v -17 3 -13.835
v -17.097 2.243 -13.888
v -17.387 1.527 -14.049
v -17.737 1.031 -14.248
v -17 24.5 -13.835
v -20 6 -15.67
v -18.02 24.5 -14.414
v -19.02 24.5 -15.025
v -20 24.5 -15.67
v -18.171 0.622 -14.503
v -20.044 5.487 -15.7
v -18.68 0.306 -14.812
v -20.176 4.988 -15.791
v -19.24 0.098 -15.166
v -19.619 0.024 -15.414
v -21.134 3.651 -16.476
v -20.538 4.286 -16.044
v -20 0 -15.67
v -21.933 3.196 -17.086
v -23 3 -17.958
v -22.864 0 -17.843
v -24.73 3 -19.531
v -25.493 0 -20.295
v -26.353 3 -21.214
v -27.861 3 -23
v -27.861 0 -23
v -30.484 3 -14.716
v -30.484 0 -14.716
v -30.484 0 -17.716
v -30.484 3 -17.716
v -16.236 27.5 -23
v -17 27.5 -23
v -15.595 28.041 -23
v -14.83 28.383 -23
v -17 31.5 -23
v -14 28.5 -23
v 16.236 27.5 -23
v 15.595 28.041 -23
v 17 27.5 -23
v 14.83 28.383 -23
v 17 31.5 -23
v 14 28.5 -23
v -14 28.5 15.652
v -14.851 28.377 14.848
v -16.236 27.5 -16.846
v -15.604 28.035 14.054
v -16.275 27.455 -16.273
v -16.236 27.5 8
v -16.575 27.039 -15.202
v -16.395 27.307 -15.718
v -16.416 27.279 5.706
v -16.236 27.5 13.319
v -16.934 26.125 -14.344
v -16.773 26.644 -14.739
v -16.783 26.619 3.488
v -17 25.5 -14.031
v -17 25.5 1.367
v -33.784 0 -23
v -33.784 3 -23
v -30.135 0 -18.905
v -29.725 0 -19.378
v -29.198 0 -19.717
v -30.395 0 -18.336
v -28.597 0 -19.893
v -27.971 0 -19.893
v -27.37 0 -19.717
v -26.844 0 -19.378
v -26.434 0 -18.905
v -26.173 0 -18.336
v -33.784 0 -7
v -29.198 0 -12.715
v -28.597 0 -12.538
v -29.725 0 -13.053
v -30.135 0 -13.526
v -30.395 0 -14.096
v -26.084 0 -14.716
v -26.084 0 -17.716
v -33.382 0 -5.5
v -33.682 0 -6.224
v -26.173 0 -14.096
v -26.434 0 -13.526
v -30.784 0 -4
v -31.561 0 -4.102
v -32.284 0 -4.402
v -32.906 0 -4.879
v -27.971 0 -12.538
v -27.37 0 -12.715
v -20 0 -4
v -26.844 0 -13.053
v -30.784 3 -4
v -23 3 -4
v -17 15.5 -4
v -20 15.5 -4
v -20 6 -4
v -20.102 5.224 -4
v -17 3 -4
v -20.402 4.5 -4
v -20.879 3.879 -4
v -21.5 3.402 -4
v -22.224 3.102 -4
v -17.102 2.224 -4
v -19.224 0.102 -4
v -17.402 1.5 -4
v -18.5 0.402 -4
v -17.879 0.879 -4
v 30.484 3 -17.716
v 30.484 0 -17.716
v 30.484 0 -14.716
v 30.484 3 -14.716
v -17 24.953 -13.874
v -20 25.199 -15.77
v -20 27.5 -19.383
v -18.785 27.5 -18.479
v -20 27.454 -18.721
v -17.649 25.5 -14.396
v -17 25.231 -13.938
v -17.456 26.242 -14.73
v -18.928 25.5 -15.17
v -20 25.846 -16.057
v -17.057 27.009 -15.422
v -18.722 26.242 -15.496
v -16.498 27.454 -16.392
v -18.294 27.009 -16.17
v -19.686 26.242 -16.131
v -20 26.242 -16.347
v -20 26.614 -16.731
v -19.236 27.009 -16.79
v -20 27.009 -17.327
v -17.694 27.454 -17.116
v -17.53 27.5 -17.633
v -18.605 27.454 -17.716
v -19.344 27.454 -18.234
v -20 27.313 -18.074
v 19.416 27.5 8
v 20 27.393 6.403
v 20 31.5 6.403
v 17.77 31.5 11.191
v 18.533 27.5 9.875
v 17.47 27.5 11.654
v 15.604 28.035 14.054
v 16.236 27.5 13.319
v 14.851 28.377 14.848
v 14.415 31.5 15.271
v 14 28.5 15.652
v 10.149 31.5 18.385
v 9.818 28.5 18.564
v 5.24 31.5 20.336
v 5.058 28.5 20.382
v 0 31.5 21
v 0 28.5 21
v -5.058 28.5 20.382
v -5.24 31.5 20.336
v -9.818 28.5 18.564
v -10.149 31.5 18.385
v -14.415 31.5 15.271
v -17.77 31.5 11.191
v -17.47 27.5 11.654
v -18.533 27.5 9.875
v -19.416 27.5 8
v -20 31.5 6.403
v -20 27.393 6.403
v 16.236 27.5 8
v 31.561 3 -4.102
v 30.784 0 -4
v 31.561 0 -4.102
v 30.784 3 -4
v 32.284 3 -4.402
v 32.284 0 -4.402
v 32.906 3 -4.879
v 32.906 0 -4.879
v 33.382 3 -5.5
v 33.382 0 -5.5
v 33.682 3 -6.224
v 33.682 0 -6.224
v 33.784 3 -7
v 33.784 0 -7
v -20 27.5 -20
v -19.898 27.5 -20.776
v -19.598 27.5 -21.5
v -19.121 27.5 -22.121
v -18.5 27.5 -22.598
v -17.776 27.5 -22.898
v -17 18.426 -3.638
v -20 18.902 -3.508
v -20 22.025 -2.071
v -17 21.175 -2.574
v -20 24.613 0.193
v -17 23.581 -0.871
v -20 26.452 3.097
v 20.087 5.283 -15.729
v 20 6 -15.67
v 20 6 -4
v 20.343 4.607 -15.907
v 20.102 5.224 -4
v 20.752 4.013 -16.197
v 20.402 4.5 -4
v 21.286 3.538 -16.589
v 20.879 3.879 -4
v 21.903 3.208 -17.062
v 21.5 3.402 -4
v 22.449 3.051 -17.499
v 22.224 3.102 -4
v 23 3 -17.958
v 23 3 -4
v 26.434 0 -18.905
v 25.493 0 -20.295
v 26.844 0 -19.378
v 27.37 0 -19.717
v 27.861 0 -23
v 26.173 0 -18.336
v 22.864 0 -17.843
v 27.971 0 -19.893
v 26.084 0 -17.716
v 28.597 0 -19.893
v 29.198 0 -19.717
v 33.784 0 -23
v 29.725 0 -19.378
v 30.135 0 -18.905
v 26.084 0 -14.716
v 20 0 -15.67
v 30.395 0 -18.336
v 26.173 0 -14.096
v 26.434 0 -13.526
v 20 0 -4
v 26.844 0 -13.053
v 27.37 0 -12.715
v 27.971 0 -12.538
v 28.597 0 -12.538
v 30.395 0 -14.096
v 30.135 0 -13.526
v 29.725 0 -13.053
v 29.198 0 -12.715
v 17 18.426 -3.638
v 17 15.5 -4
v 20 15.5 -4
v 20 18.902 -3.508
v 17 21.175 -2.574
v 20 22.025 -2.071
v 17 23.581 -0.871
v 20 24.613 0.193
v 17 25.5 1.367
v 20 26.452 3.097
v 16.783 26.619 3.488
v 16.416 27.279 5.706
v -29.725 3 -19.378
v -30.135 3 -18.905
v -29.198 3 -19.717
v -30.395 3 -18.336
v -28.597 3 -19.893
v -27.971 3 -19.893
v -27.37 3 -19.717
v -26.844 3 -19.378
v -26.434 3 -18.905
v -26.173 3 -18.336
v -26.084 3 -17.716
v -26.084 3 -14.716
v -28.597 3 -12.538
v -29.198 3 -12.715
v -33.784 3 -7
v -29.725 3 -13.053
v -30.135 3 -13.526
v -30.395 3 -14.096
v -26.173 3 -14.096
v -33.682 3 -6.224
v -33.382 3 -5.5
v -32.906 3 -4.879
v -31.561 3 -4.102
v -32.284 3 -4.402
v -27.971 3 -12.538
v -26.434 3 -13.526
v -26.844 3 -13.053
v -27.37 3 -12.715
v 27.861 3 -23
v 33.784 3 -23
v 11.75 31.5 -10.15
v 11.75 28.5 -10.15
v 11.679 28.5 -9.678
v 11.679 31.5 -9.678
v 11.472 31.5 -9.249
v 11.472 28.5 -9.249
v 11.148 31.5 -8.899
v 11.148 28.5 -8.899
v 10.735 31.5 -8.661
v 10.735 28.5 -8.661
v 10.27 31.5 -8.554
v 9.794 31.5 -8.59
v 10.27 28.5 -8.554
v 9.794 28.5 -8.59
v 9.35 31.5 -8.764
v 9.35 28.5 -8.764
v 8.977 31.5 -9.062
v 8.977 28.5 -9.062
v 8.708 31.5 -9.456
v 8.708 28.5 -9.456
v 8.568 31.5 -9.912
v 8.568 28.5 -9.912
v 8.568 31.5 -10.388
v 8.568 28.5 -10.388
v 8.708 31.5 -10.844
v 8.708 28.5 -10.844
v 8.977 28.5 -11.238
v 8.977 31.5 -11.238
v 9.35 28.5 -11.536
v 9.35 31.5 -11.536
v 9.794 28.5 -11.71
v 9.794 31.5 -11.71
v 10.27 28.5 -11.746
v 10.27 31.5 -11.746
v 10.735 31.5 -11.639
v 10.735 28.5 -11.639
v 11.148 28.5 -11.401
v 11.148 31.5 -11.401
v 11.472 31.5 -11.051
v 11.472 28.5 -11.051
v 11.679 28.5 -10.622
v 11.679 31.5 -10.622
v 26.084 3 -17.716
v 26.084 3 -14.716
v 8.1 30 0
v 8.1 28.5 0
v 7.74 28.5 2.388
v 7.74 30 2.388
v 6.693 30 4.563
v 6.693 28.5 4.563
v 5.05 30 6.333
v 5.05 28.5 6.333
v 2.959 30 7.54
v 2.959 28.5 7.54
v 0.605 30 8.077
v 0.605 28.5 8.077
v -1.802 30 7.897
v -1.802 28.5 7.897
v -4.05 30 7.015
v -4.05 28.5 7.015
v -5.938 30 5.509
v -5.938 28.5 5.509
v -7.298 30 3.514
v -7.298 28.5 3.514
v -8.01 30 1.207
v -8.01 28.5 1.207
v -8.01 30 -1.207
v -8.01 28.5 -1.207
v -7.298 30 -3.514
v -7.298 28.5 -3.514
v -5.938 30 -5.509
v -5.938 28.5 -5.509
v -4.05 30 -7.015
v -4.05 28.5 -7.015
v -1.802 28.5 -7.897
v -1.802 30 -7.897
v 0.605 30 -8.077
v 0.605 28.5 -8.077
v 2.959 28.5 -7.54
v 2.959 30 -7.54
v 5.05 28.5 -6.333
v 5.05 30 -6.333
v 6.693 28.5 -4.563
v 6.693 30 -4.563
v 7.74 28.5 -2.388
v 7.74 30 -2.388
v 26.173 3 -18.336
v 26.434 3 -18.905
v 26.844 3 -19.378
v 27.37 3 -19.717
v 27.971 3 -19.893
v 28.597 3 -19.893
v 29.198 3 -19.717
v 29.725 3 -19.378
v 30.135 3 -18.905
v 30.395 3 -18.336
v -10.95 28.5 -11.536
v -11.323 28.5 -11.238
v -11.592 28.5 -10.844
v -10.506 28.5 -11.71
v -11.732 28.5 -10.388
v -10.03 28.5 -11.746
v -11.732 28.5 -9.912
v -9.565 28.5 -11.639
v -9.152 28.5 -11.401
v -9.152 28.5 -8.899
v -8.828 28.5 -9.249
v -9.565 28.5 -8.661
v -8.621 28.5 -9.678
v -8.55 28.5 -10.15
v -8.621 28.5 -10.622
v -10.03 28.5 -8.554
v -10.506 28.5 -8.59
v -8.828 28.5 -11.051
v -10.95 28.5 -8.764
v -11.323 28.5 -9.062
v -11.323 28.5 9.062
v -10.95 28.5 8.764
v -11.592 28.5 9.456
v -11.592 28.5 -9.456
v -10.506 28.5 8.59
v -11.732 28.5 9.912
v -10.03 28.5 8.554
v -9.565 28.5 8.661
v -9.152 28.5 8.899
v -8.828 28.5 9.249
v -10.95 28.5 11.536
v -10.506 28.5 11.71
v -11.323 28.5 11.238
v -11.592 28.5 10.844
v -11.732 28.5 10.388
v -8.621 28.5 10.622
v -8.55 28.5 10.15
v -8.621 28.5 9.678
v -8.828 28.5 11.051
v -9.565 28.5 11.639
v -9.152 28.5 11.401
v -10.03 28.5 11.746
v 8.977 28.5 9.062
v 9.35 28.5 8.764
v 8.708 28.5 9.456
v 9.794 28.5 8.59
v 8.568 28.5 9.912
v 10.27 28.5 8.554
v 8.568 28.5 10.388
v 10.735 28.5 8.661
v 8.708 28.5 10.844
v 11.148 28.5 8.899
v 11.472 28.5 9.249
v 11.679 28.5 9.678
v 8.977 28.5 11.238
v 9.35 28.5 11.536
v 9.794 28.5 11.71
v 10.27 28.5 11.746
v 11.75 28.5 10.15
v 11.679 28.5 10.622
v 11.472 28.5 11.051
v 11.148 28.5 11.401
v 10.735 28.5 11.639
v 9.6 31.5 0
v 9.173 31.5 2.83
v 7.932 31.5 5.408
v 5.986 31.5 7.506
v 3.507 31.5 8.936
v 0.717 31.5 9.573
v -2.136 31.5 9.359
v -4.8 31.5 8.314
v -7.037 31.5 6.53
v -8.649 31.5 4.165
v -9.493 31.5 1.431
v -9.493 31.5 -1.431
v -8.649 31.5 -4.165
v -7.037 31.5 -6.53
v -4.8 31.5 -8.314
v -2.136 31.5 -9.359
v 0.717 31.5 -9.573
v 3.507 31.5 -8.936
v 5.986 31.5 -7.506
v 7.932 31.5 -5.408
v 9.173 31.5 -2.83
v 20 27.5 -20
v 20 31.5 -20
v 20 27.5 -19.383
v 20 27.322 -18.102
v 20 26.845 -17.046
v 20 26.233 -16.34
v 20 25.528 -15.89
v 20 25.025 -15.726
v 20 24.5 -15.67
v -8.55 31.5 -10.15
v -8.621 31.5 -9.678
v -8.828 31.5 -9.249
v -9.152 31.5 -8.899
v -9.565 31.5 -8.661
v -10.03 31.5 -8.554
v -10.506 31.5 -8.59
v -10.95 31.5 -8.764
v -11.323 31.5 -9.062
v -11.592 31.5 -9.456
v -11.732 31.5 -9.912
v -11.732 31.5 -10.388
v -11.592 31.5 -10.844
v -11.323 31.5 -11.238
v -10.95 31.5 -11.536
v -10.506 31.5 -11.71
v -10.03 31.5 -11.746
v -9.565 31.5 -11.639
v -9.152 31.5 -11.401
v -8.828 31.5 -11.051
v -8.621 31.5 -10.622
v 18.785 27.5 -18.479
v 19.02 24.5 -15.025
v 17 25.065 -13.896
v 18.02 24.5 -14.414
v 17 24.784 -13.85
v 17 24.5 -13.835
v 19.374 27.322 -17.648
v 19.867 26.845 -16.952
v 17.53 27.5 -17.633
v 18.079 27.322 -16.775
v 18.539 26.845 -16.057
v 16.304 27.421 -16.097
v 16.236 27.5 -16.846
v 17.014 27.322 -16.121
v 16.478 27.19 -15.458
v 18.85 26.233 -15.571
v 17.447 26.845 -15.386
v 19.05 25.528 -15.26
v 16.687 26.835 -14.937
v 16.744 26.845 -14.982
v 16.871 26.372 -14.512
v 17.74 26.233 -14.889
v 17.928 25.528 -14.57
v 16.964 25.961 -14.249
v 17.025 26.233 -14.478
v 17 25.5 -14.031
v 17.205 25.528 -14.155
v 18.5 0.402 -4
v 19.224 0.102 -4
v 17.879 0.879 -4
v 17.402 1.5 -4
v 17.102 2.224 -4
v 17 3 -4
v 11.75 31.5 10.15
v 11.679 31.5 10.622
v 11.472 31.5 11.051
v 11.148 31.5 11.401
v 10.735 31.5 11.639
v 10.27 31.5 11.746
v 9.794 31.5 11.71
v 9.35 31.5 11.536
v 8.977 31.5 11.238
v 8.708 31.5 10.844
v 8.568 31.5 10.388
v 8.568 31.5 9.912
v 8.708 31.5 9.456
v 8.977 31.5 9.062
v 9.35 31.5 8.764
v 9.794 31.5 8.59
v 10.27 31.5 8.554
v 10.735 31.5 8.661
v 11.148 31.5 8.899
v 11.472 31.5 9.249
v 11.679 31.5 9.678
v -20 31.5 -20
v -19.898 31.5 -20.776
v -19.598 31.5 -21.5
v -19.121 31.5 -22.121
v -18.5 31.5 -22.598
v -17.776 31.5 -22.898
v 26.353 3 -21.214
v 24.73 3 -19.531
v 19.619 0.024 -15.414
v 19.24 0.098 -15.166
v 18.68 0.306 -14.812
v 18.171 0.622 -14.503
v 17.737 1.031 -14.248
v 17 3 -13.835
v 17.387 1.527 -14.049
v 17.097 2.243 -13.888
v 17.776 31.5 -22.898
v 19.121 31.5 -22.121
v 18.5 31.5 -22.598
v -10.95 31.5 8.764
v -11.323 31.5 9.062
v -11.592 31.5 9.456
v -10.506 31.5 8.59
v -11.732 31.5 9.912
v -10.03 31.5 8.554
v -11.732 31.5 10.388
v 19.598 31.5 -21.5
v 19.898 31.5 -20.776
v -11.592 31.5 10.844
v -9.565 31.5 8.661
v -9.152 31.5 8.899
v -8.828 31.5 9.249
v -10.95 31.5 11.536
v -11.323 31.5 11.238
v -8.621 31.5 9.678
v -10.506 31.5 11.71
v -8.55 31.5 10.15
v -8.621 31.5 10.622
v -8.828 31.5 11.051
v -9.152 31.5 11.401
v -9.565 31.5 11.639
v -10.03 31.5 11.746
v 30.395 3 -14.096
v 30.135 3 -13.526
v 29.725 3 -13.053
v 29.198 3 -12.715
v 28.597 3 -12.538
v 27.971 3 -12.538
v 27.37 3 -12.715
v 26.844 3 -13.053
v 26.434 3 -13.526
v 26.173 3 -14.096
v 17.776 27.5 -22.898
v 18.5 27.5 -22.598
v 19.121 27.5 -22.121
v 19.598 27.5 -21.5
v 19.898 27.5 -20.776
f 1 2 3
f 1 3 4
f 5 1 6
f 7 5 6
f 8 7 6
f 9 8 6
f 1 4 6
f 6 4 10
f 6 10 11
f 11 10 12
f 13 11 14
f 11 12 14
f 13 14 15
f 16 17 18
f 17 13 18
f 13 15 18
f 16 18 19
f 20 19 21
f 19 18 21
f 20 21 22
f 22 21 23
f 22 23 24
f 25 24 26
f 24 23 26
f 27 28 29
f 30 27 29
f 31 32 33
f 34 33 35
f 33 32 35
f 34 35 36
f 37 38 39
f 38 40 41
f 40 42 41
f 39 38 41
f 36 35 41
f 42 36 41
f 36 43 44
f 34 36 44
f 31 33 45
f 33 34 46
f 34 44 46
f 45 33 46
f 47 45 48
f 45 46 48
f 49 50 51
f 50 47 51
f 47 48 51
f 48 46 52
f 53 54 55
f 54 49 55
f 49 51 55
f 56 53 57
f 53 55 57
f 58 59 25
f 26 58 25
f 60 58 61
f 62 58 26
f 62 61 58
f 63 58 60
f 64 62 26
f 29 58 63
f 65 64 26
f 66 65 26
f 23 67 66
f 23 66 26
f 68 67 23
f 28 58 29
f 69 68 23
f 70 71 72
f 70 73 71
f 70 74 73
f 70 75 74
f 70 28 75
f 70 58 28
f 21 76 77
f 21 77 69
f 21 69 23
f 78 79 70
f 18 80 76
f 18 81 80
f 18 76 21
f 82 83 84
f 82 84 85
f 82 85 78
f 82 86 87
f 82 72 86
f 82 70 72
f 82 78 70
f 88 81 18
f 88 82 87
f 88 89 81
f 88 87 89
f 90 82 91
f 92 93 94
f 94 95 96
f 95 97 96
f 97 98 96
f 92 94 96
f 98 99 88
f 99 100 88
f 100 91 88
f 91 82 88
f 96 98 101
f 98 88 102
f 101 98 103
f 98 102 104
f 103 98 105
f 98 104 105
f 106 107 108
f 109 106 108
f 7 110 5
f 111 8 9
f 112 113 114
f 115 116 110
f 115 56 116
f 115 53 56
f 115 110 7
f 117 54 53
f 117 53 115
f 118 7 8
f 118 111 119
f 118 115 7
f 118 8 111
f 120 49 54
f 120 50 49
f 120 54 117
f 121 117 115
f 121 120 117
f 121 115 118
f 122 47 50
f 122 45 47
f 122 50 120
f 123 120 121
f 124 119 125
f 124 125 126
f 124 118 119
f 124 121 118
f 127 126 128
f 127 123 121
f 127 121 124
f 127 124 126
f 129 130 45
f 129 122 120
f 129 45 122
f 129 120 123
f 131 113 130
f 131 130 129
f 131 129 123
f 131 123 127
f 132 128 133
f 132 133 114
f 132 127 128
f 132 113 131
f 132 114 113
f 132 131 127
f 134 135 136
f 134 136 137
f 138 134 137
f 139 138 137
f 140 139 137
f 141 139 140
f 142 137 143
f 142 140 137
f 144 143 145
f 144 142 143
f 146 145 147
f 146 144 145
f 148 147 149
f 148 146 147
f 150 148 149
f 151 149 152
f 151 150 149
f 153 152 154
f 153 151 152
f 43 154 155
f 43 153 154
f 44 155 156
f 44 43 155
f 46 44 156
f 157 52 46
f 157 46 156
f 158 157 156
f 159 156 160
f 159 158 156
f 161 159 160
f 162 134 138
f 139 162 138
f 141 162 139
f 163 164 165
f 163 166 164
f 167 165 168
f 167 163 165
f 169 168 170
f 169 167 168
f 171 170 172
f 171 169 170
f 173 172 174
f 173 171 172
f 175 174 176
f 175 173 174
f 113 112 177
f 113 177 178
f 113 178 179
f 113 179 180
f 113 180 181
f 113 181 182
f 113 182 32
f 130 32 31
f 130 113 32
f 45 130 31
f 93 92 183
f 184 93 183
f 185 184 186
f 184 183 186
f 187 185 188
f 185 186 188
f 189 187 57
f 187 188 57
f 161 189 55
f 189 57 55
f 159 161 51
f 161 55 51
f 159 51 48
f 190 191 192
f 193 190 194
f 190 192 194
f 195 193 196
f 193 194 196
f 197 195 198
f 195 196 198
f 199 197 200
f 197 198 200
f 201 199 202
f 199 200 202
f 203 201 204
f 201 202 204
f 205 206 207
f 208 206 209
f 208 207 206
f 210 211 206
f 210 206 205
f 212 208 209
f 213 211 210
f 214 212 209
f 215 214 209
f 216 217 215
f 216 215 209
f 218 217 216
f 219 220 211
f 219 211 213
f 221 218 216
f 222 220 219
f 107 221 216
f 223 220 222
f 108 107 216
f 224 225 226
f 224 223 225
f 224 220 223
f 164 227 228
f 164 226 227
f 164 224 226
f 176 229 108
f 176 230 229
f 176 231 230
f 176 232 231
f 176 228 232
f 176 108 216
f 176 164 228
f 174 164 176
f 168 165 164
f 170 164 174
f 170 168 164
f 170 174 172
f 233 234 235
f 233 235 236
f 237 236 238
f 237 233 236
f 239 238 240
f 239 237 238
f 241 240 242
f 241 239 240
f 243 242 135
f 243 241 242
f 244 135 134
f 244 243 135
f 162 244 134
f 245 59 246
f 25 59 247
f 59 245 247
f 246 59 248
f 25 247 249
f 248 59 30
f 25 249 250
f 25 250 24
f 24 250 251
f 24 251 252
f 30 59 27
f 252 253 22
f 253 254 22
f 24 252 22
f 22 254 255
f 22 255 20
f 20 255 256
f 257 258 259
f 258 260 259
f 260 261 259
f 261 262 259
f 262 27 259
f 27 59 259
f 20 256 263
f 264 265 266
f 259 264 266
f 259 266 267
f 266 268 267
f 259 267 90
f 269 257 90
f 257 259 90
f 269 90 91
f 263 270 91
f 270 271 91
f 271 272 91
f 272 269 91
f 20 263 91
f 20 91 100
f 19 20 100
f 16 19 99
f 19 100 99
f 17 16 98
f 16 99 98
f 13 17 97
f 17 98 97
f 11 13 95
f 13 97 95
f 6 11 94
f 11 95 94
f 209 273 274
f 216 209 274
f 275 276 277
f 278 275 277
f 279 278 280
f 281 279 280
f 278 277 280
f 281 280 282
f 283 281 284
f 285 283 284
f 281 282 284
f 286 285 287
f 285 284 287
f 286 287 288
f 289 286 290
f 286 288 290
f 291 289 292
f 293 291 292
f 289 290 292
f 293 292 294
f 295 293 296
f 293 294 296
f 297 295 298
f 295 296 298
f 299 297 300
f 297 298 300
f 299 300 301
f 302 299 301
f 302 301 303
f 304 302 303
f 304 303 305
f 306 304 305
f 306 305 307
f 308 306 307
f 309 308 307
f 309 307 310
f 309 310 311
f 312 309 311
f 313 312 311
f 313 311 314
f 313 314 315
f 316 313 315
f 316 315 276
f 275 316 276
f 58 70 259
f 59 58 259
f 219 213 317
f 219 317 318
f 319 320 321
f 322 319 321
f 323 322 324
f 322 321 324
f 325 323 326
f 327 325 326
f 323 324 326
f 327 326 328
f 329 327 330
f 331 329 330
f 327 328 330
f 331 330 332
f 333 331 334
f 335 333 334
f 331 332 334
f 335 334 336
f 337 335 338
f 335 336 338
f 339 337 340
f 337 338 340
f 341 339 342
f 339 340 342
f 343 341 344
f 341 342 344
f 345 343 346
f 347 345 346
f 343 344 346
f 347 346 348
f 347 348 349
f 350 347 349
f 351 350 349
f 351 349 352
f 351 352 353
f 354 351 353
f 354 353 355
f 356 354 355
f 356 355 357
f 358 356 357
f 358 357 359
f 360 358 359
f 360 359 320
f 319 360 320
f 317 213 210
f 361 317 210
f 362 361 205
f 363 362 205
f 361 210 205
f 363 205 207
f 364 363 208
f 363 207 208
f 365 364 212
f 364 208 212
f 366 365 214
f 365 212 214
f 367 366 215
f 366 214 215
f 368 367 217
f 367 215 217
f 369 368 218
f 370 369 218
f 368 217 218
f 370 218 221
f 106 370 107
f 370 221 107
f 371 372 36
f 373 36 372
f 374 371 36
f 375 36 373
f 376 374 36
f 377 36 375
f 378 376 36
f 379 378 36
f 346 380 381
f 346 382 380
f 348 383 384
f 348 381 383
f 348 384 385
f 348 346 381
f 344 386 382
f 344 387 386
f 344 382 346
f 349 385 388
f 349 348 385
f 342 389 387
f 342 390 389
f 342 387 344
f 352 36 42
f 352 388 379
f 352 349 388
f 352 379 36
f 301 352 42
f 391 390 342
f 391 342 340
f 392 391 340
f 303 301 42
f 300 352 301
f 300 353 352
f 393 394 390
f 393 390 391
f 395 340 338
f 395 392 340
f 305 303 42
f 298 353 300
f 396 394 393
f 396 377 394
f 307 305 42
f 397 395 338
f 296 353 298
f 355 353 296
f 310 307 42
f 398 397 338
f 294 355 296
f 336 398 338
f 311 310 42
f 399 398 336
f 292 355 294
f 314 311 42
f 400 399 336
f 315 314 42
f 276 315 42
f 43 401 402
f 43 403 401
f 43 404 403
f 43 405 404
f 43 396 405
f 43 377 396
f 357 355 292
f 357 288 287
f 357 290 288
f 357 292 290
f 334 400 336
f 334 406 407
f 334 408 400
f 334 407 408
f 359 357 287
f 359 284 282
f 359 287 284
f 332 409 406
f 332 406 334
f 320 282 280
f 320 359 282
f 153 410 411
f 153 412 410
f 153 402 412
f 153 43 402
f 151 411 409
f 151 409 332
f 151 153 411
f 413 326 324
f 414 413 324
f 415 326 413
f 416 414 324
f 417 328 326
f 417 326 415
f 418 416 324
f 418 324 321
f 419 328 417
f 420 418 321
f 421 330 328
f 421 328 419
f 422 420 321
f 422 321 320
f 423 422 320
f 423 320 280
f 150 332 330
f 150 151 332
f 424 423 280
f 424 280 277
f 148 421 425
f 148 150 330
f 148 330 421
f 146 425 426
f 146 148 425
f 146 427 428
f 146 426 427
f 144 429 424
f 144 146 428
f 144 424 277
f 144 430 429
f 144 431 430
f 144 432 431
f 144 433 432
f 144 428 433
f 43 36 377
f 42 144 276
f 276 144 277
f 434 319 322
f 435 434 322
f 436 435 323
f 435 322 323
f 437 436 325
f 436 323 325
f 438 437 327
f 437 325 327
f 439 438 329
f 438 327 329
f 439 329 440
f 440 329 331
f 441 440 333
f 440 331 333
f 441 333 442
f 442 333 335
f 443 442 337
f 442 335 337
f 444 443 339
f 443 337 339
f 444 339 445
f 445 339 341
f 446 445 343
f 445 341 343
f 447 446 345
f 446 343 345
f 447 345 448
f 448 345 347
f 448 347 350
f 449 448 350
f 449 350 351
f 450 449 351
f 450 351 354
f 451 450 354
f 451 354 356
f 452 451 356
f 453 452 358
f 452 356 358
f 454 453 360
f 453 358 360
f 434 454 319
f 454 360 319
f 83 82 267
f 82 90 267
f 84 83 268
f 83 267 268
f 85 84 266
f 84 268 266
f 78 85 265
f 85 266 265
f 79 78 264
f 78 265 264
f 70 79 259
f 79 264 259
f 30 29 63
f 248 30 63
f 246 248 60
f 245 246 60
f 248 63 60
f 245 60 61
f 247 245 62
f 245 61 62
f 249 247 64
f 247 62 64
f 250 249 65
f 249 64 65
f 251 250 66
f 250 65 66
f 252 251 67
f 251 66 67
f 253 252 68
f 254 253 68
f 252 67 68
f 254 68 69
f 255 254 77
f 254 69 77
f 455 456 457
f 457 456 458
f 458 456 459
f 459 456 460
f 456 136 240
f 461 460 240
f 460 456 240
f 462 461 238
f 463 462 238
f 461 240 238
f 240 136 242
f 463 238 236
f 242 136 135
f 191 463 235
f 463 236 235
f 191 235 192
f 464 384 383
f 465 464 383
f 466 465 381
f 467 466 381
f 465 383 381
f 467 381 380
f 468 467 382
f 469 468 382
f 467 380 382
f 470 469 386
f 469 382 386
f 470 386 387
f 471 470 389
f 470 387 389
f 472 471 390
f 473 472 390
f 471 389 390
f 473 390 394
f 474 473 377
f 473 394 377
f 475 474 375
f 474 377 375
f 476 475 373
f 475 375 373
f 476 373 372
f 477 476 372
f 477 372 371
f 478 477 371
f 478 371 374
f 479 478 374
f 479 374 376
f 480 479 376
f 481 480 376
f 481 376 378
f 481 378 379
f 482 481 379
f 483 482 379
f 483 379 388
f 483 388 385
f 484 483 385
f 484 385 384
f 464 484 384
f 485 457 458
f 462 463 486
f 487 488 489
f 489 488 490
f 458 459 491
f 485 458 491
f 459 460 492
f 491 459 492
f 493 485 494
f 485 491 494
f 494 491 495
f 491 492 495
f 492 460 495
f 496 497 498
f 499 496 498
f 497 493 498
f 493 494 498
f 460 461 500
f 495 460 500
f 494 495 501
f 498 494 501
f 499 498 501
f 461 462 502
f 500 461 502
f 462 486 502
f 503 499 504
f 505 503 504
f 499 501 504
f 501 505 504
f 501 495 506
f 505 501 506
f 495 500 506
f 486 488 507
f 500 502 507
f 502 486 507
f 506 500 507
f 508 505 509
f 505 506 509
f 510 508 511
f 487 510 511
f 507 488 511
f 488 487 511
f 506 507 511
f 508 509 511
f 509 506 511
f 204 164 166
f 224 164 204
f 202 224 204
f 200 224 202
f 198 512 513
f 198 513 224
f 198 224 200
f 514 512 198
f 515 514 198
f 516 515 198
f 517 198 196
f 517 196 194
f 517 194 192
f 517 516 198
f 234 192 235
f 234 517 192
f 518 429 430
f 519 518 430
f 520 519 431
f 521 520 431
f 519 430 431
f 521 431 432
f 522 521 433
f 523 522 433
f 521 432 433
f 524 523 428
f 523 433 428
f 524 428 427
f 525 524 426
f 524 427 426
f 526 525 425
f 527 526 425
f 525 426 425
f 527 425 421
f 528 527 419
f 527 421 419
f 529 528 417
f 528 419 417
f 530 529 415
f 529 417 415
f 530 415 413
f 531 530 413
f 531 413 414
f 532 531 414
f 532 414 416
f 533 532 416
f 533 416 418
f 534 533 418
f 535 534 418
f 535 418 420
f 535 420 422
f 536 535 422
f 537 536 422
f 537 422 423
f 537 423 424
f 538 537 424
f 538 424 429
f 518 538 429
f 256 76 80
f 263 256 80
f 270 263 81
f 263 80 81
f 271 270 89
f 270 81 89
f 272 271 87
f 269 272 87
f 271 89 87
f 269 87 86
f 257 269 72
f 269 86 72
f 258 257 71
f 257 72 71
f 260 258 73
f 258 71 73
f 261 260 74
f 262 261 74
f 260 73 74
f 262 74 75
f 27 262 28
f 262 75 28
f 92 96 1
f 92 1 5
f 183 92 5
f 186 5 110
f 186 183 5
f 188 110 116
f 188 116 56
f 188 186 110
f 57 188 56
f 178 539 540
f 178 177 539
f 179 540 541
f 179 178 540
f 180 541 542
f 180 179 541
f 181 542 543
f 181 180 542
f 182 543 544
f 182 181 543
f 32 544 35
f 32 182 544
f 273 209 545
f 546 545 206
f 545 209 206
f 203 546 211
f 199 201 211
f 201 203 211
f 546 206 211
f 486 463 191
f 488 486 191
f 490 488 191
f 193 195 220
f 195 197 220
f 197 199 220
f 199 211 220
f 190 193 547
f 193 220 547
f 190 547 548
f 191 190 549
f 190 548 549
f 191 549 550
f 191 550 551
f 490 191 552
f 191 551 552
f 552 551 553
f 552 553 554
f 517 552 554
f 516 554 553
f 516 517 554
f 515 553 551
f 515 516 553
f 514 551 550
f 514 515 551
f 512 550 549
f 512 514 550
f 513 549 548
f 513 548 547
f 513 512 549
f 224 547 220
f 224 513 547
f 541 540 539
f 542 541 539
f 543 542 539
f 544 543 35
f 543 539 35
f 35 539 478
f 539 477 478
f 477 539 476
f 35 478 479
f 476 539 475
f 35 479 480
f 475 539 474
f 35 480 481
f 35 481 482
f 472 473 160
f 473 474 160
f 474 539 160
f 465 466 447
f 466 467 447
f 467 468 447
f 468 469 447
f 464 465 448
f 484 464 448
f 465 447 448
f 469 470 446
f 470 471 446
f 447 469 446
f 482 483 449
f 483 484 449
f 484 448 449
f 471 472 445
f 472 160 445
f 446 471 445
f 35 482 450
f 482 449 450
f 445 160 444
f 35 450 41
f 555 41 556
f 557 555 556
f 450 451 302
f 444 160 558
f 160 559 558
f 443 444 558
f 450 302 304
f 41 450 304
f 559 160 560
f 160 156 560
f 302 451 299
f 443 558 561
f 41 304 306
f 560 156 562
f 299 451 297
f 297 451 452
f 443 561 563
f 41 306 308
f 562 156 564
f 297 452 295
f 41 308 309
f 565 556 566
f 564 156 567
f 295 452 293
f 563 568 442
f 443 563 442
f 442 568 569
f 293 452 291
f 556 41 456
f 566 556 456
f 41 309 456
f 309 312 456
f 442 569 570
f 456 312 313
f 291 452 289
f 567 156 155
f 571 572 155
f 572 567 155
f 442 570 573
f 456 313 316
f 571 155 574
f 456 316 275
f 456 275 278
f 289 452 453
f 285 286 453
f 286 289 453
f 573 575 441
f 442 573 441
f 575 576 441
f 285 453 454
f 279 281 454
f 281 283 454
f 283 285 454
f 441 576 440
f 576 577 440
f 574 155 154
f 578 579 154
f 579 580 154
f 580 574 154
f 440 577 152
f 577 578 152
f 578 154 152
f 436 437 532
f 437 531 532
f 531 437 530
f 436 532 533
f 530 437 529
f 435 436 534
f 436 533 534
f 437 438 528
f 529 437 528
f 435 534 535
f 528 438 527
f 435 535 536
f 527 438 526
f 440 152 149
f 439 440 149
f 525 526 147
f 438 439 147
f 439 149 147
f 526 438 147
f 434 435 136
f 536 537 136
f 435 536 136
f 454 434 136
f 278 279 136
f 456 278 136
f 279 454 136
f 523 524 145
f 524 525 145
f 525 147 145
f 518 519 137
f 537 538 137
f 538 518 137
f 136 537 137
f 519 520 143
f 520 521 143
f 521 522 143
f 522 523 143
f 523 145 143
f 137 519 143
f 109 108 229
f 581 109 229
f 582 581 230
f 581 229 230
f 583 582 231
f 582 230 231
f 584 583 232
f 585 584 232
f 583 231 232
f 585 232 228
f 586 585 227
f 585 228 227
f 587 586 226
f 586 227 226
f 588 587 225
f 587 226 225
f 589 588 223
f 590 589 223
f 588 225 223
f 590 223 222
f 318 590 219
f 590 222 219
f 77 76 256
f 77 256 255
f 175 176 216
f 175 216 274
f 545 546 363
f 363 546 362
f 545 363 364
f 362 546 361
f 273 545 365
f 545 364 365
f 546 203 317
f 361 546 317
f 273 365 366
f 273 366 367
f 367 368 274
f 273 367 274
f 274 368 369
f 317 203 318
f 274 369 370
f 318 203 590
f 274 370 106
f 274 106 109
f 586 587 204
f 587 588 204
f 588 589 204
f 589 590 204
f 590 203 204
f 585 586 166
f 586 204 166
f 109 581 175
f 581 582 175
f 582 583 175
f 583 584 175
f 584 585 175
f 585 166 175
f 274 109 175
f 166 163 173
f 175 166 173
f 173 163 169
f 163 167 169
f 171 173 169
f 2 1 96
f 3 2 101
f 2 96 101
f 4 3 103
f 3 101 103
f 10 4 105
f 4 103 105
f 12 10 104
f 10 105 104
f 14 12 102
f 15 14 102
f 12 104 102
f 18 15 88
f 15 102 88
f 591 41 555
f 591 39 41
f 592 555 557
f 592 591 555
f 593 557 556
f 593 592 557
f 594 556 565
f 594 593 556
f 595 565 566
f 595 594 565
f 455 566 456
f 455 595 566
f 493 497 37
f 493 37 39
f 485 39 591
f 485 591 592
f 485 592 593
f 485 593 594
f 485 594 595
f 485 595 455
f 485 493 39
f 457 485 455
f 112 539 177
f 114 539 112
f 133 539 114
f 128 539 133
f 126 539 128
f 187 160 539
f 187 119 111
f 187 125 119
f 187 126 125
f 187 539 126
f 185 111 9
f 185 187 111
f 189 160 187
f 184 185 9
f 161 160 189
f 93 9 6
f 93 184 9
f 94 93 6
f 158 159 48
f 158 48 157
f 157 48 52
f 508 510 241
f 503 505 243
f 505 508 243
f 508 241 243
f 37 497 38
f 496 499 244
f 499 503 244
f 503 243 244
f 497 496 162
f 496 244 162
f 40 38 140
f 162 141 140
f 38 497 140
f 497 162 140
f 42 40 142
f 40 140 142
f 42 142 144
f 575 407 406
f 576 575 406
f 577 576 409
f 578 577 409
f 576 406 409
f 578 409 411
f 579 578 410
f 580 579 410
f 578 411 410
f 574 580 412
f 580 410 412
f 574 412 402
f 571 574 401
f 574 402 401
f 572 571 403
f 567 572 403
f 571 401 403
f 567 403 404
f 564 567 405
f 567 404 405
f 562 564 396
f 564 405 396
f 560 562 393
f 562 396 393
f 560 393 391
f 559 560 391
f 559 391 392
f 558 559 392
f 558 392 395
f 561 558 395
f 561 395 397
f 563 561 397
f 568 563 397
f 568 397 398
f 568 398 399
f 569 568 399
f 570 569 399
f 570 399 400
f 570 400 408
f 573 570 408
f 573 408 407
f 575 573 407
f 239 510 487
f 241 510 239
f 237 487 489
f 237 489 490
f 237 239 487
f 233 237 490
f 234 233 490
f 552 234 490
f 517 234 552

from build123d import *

# Parameters (mm, degrees)
PAD_DEPTH            = 21
PAD_DEPTH_BACK       = 23
POCKET_DEPTH         = 27.5
POCKET001_DEPTH      = 31.501
POCKET002_DEPTH      = 33.78525
POCKET002_DEPTH_BACK = -33.78525
SKETCH004_R          = 1.6
SKETCH004_R_2        = 8.1
POCKET003_DEPTH      = 31.501
CHAMFER_SIZE         = 1.5
FILLET_R             = 3


with BuildPart() as part:
    # Sketch → Pad (new body, two sides)
    with BuildSketch(Plane.XY) as pad_sk:
        with BuildLine():
            Line((-33.78425, 0), (-17, 0))
            Line((-17, 0), (-17, 25.5))
            ThreePointArc((-14, 28.5), (-16.12132, 27.62132), (-17, 25.5))
            Line((-14, 28.5), (14, 28.5))
            ThreePointArc((17, 25.5), (16.12132, 27.62132), (14, 28.5))
            Line((17, 25.5), (17, 0))
            Line((17, 0), (33.78425, 0))
            Line((33.78425, 0), (33.78425, 3))
            Line((23, 3), (33.78425, 3))
            ThreePointArc((20, 6), (20.87868, 3.87868), (23, 3))
            Line((20, 31.5), (20, 6))
            Line((-20, 31.5), (20, 31.5))
            Line((-20, 31.5), (-20, 6))
            ThreePointArc((-23, 3), (-20.87868, 3.87868), (-20, 6))
            Line((-33.78425, 3), (-23, 3))
            Line((-33.78425, 0), (-33.78425, 3))
        make_face()
    extrude(amount=PAD_DEPTH)
    extrude(pad_sk.sketch, amount=-PAD_DEPTH_BACK)

    # Sketch001 → Pocket (cut)
    with BuildSketch(Plane.XZ):
        with BuildLine():
            ThreePointArc((26.084271, -17.715729), (28.284271, -19.915729), (30.484271, -17.715729))
            Line((30.484271, -17.715729), (30.484271, -14.715729))
            ThreePointArc((30.484271, -14.715729), (28.284271, -12.515729), (26.084271, -14.715729))
            Line((26.084271, -17.715729), (26.084271, -14.715729))
        make_face()
        with BuildLine():
            ThreePointArc((-26.084271, -14.715729), (-28.284271, -12.515729), (-30.484271, -14.715729))
            Line((-30.484271, -14.715729), (-30.484271, -17.715729))
            ThreePointArc((-30.484271, -17.715729), (-28.284271, -19.915729), (-26.084271, -17.715729))
            Line((-26.084271, -14.715729), (-26.084271, -17.715729))
        make_face()
        with BuildLine():
            Line((-35.5, -45), (35.5, -45))
            ThreePointArc((35.5, -45), (25.102291, -19.897709), (0, -9.5))
            ThreePointArc((0, -9.5), (-25.102291, -19.897709), (-35.5, -45))
        make_face()
    extrude(amount=-POCKET_DEPTH, mode=Mode.SUBTRACT)

    # Sketch002 → Pocket001 (cut, through all)
    with BuildSketch(Plane.XZ):
        with BuildLine():
            ThreePointArc((21, 0), (0, 21), (-21, 0))
            Line((-21, -4), (-21, 0))
            Line((-38, -4), (-21, -4))
            Line((-38, 34), (-38, -4))
            Line((38, 34), (-38, 34))
            Line((38, -4), (38, 34))
            Line((21, -4), (38, -4))
            Line((21, 0), (21, -4))
        make_face()
    extrude(amount=-POCKET001_DEPTH, mode=Mode.SUBTRACT)

    # Sketch005 → Pocket002 (cut, two sides)
    with BuildSketch(Plane.YZ) as pocket002_sk:
        with BuildLine():
            Line((0, -4), (15.5, -4))
            ThreePointArc((15.5, -4), (23.985281, -0.485281), (27.5, 8))
            Line((27.5, 8), (27.5, 26))
            Line((27.5, 26), (0, 26))
            Line((0, 26), (0, -4))
        make_face()
    extrude(amount=-POCKET002_DEPTH, mode=Mode.SUBTRACT)
    extrude(pocket002_sk.sketch, amount=-POCKET002_DEPTH_BACK, mode=Mode.SUBTRACT)

    # Sketch004 → Pocket003 (cut, through all)
    with BuildSketch(Plane.XZ):
        with Locations((-10.15, 10.15)):
            Circle(SKETCH004_R)
        with Locations((10.15, 10.15)):
            Circle(SKETCH004_R)
        with Locations((10.15, -10.15)):
            Circle(SKETCH004_R)
        with Locations((-10.15, -10.15)):
            Circle(SKETCH004_R)
        Circle(SKETCH004_R_2)
    extrude(amount=-POCKET003_DEPTH, mode=Mode.SUBTRACT)

    # Chamfer
    chamfer_edges = [part.edges().sort_by_distance(p)[0] for p in [
        (-8.1, 31.5, 0),
    ]]
    chamfer(chamfer_edges, length=CHAMFER_SIZE)

    # Fillet
    fillet_edges = [part.edges().sort_by_distance(p)[0] for p in [
        (33.78425, 1.5, -4),
        (-33.78425, 1.5, -4),
        (-20, 29.5, -23),
        (20, 29.5, -23),
        (-17, 0, -8.917558),
        (17, 0, -8.917558),
        (-18.152606, 27.5, -14.492085),
        (18.152606, 27.5, -14.492085),
    ]]
    fillet(fillet_edges, radius=FILLET_R)


solid = part.part
